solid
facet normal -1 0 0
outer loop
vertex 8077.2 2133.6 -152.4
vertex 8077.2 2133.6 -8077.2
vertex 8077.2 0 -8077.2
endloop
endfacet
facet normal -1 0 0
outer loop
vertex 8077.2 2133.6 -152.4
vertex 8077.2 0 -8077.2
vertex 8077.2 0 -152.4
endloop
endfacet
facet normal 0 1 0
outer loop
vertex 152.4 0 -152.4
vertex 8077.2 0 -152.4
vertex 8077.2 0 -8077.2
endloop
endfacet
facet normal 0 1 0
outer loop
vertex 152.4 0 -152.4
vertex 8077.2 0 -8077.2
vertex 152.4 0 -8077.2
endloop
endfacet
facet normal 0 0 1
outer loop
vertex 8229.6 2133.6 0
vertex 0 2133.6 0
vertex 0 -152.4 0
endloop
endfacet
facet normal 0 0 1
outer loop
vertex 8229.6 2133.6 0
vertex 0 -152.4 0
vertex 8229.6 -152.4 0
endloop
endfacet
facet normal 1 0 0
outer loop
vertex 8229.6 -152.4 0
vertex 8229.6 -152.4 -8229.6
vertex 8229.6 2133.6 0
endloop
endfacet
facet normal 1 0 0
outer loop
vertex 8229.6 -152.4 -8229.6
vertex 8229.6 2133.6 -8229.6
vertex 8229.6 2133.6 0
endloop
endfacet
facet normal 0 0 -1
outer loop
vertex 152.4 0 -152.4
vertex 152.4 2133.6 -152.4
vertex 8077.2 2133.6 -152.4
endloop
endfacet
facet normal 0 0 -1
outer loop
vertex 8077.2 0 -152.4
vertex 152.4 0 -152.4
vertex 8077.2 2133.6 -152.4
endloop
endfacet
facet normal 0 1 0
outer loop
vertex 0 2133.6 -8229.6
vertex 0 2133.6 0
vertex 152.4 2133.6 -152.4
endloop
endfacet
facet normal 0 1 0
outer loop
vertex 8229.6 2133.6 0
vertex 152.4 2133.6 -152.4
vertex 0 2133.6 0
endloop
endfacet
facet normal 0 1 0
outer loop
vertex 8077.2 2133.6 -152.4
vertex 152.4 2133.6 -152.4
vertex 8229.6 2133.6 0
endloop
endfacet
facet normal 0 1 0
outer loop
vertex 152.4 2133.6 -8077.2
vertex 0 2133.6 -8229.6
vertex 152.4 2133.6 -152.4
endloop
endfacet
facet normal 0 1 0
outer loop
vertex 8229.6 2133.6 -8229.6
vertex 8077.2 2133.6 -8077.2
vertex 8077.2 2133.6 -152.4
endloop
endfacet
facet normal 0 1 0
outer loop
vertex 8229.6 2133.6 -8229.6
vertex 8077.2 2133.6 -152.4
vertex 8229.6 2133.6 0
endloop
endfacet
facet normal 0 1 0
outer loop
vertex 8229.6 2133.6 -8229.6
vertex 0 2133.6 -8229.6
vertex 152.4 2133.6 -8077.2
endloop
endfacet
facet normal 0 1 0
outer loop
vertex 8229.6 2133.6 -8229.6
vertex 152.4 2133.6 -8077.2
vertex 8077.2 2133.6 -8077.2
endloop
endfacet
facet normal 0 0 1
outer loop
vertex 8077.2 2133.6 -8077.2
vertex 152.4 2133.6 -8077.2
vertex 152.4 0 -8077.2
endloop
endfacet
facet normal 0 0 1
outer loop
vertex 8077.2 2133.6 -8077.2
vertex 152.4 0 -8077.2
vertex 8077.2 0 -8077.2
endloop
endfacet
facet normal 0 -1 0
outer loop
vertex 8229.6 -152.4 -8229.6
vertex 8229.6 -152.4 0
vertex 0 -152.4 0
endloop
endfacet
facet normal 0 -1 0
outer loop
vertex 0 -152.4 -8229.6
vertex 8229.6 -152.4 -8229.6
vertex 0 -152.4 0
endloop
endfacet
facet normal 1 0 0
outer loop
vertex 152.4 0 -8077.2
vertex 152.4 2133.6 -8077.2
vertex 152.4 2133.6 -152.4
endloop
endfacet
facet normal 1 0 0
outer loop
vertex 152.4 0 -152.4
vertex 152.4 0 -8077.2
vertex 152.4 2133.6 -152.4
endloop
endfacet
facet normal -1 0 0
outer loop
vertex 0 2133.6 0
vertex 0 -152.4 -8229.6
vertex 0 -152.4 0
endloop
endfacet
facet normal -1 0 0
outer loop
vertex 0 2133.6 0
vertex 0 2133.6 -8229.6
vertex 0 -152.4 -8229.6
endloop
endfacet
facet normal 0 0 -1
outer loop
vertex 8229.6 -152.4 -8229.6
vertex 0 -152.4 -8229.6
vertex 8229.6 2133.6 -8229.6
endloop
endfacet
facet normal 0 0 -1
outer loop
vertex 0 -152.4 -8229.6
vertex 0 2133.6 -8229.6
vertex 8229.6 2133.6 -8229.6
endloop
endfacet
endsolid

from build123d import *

# Parameters (mm, degrees)
SKETCH1_W      = 8229.6
SKETCH1_H      = 8229.6
EXTRUDE2_DEPTH = 2133.6
SKETCH3_W      = 7924.8
SKETCH3_H      = 7924.8
EXTRUDE3_DEPTH = 11833.365836129
SKETCH4_W      = 8229.6
SKETCH4_H      = 8229.6
SKETCH4_W_2    = 7924.8
SKETCH4_H_2    = 7924.8
EXTRUDE4_DEPTH = 152.4
SKETCH6_W      = 7924.8
SKETCH6_H      = 152.4
EXTRUDE5_DEPTH = 7924.8


with BuildPart() as part:
    # Sketch1 → Extrude2 (new body)
    with BuildSketch(Plane(origin=(0, 0, 0), x_dir=(1, 0, 0), z_dir=(0, 1, 0))):
        with Locations((4114.8, 4114.8)):
            Rectangle(SKETCH1_W, SKETCH1_H)
    extrude(amount=EXTRUDE2_DEPTH)

    # Sketch3 → Extrude3 (cut, through all)
    with BuildSketch(Plane(origin=(0, 2133.6, 0), x_dir=(1, 0, 0), z_dir=(0, 1, 0))):
        with Locations((4114.8, 4114.8)):
            Rectangle(SKETCH3_W, SKETCH3_H)
    extrude(amount=-EXTRUDE3_DEPTH, mode=Mode.SUBTRACT)

    # Sketch4 → Extrude4 (add)
    with BuildSketch(Plane.XZ):
        with Locations((4114.8, -4114.8)):
            Rectangle(SKETCH4_W, SKETCH4_H)
        with Locations((4114.8, -4114.8)):
            Rectangle(SKETCH4_W_2, SKETCH4_H_2, mode=Mode.SUBTRACT)
    extrude(amount=EXTRUDE4_DEPTH)

    # Sketch6 → Extrude5 (add)
    with BuildSketch(Plane(origin=(0, 0, -152.4), x_dir=(-1, 0, 0), z_dir=(0, 0, -1))):
        with Locations((-4114.8, -76.2)):
            Rectangle(SKETCH6_W, SKETCH6_H)
    extrude(amount=EXTRUDE5_DEPTH)


solid = part.part
